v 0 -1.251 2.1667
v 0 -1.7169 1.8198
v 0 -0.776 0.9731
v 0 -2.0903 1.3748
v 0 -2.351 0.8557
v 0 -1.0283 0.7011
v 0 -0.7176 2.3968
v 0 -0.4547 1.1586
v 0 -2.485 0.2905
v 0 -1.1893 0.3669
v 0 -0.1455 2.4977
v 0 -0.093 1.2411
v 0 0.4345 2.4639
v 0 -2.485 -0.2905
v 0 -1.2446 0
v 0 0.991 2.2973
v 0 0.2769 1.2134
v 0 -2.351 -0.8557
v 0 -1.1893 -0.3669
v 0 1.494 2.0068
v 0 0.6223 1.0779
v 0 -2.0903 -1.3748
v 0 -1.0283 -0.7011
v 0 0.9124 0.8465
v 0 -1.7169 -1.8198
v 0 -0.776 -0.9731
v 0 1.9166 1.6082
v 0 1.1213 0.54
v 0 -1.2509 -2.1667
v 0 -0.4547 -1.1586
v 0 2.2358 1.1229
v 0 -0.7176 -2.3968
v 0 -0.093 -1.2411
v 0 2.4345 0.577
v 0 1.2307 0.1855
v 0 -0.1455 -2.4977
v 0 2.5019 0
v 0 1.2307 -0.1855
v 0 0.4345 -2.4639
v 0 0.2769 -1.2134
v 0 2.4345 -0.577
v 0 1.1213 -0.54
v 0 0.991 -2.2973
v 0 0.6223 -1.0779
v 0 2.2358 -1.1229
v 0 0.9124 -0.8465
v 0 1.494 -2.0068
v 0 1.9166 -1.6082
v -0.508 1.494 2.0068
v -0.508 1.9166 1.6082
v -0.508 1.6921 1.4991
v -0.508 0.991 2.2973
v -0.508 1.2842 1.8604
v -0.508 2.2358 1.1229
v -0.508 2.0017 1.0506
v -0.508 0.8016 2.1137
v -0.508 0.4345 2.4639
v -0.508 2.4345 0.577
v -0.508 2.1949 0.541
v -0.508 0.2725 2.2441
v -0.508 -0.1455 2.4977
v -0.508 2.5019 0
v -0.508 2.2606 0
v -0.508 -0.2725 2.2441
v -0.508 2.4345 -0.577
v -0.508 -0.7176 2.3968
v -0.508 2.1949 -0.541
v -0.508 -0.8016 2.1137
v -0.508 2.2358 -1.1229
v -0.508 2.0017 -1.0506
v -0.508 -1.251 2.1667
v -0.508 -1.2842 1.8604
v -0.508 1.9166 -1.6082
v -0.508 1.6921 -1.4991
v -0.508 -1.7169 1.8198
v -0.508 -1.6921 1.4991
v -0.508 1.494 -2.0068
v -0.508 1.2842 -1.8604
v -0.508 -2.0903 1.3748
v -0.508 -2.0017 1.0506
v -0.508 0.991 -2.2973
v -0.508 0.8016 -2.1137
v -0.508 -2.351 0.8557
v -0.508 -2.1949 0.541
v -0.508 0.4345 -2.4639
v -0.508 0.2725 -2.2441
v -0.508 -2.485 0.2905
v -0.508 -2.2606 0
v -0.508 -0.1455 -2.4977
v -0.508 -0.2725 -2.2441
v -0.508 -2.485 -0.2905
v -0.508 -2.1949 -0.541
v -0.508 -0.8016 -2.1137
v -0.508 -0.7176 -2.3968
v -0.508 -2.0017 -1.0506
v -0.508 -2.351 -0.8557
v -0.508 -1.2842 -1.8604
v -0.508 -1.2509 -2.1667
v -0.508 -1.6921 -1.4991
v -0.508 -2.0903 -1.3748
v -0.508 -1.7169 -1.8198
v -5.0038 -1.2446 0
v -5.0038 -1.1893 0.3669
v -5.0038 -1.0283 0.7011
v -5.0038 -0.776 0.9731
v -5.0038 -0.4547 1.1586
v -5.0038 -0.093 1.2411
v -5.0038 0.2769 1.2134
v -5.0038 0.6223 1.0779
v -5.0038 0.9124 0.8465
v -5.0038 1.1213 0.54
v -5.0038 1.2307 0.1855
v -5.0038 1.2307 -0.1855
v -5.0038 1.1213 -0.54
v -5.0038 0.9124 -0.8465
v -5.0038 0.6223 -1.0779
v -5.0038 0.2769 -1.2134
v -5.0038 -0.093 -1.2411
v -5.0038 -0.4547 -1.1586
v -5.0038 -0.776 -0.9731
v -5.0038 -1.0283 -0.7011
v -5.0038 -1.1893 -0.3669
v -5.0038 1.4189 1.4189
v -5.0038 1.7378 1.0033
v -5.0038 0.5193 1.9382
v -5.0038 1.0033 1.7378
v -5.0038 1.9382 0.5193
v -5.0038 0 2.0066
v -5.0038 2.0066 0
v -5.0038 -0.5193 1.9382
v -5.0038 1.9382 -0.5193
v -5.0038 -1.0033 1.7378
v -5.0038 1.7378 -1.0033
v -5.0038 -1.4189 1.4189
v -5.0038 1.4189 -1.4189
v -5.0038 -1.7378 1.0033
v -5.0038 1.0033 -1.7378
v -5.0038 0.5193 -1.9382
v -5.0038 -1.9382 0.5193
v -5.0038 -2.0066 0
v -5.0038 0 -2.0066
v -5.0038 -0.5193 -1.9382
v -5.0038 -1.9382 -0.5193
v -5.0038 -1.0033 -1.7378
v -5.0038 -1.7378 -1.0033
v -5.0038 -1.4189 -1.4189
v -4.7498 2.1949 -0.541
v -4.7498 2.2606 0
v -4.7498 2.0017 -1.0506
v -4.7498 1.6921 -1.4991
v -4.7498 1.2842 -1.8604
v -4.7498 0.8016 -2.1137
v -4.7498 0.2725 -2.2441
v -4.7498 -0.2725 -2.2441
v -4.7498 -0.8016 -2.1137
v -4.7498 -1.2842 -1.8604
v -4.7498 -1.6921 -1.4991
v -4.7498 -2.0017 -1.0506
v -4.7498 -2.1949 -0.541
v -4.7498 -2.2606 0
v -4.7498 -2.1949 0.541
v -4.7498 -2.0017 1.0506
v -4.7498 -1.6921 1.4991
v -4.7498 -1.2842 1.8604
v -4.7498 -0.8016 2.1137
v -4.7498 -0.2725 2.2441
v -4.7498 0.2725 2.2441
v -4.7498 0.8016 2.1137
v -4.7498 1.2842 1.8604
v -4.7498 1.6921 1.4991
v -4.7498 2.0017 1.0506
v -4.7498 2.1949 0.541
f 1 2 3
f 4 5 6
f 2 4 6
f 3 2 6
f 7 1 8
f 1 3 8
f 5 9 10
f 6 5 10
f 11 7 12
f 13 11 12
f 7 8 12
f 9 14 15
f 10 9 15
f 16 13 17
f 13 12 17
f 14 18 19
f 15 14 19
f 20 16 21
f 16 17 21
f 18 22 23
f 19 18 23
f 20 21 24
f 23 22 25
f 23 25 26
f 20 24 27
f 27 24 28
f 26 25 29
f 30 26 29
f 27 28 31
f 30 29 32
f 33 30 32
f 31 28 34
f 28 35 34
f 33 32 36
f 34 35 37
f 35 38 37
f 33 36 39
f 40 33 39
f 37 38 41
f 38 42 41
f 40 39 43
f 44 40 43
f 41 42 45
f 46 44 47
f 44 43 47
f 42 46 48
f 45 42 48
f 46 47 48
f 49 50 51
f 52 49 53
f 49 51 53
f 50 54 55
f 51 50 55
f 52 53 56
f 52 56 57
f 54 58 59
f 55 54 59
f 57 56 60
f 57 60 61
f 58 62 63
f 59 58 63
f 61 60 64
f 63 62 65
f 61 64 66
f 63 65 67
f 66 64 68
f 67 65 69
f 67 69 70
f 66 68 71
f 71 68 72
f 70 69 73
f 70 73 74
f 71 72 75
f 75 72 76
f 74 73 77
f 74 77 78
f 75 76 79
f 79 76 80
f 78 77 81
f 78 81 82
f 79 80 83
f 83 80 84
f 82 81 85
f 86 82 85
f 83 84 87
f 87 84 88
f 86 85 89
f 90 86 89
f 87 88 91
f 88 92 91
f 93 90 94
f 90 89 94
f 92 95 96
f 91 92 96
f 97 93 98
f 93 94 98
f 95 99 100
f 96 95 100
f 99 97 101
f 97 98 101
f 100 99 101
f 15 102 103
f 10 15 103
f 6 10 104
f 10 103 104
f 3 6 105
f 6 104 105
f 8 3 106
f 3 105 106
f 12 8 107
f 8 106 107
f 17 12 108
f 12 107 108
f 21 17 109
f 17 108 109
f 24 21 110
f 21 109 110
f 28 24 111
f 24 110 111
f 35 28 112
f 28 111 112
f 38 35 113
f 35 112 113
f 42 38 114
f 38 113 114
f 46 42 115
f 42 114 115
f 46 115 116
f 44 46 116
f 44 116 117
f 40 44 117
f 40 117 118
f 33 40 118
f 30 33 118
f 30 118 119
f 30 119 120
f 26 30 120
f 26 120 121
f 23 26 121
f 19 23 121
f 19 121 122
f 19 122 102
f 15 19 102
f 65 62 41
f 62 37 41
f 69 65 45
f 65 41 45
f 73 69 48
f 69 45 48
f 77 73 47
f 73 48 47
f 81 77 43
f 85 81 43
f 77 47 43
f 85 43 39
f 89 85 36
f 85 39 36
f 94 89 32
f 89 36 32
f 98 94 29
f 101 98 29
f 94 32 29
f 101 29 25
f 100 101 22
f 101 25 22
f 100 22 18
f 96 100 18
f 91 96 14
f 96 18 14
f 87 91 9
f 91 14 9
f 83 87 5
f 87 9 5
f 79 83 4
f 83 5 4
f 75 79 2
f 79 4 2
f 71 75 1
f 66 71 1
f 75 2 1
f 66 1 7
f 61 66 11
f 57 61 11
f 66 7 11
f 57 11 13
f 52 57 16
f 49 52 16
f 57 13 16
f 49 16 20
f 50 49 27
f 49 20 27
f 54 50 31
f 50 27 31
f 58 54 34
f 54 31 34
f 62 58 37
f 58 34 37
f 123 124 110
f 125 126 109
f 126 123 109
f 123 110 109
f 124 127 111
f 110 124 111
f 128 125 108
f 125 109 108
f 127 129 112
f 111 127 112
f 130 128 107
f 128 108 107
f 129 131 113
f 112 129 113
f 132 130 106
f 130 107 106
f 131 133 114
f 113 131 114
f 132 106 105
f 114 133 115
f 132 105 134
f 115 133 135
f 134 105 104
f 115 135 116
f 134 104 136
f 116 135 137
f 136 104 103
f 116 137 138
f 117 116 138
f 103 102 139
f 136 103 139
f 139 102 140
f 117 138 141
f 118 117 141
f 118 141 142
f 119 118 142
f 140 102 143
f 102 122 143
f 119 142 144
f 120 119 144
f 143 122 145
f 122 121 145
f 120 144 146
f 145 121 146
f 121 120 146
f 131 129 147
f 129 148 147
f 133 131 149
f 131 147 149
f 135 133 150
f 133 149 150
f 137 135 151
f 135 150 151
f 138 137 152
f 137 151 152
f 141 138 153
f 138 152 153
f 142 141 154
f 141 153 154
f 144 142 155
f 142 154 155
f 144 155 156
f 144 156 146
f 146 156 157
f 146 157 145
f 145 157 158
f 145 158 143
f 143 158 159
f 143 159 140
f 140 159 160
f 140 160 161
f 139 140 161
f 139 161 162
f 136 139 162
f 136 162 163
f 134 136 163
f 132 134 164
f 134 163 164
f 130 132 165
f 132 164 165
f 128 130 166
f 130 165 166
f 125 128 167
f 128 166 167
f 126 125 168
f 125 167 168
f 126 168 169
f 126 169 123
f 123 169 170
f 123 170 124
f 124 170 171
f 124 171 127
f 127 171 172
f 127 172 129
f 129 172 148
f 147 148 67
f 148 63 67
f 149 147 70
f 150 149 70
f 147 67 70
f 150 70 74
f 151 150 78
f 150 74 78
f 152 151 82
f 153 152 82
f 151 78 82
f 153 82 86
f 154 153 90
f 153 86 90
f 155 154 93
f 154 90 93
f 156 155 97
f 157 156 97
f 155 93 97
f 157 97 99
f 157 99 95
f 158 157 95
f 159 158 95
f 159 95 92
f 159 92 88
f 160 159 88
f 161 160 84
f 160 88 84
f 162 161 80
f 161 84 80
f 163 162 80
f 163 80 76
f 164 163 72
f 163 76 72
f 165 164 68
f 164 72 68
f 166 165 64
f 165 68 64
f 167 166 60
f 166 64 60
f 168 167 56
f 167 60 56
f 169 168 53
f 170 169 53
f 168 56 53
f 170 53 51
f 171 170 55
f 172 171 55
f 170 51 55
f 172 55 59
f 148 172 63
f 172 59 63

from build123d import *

# Parameters (mm, degrees)
M3X0_25_4H_TAPPED_HOLE1_D = 2.4892


with BuildPart() as part:
    # Sketch1 one side → Revolve1 (revolve)
    with BuildSketch(Plane.XY, mode=Mode.PRIVATE) as revolve1_sk:
        Polygon((-0.508, -2.5019), (0, -2.5019), (0, 0), (-5.0038, 0), (-5.0038, -2.0066), (-4.7498, -2.2606), (-0.508, -2.2606), align=None)
    revolve(revolve1_sk.sketch.rotate(Axis((0, 0, 0), (-1, 0, 0)), 180), axis=Axis((0, 0, 0), (-1, 0, 0)))  # turned: the seam where the file's is

    # M3x0.25-4h Tapped Hole1 (through all)
    with Locations(Plane.YZ):
        with Locations((0, 0)):
            Hole(M3X0_25_4H_TAPPED_HOLE1_D / 2)


solid = part.part
